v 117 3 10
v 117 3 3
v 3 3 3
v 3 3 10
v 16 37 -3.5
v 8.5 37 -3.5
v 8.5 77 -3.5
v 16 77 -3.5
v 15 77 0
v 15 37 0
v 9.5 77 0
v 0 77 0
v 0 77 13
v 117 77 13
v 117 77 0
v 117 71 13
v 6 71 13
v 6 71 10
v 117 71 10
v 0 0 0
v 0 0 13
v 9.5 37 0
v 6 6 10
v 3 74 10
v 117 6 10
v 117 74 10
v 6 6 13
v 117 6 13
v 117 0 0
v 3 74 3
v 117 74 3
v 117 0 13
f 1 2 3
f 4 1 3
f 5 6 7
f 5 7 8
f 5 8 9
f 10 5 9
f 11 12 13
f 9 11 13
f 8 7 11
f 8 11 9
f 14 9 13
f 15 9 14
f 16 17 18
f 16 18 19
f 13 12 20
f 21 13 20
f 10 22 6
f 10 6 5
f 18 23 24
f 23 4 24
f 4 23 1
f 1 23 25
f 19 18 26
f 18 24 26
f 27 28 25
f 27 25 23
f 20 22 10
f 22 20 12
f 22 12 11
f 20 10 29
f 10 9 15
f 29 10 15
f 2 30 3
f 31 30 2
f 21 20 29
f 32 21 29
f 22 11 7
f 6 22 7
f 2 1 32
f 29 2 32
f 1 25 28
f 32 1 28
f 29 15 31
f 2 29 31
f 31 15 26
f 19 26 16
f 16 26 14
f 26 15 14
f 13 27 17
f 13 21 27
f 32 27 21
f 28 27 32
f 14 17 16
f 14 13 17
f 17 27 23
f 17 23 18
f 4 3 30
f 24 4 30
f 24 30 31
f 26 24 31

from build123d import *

# Parameters (mm, degrees)
F0_W      = 117
F0_H      = 77
F1_DEPTH  = 3
F3_DEPTH  = 10
F4_W      = 71
F4_H      = 3
F5_DEPTH  = 3
F6_W      = 111
F6_H      = 3
F7_DEPTH  = 3
F8_W      = 111
F8_H      = 3
F9_DEPTH  = 3
F10_W     = 7.5
F10_H     = 40
F11_DEPTH = 3.5
F13_DEPTH = 40
F14_DEPTH = 40


with BuildPart() as f1:
    # F0 (on Top) → F1 (new body)
    with BuildSketch(Plane.XY):
        with Locations((58.5, 38.5)):
            Rectangle(F0_W, F0_H)
    extrude(amount=F1_DEPTH)

    # F2 (on face) → F3 (join)
    with BuildSketch(Plane.XY.offset(3)):
        Polygon((117, 0), (117, 3), (3, 3), (3, 74), (117, 74), (117, 77), (0, 77), (0, 0), align=None)
    extrude(amount=F3_DEPTH)

    # F4 (on face) → F5 (join)
    with BuildSketch(Plane.YZ.offset(3)):
        with Locations((38.5, 11.5)):
            Rectangle(F4_W, F4_H)
    extrude(amount=F5_DEPTH)

    # F6 (on face) → F7 (join)
    with BuildSketch(Plane(origin=(0, 3, 0), x_dir=(-1, 0, 0), z_dir=(0, 1, 0))):
        with Locations((-61.5, 11.5)):
            Rectangle(F6_W, F6_H)
    extrude(amount=F7_DEPTH)

    # F8 (on face) → F9 (join)
    with BuildSketch(Plane.XZ.offset(-74)):
        with Locations((61.5, 11.5)):
            Rectangle(F8_W, F8_H)
    extrude(amount=F9_DEPTH)

    # F10 (on face) → F11 (join)
    with BuildSketch(Plane(origin=(0, 0, 0), x_dir=(1, 0, 0), z_dir=(0, 0, -1))):
        with Locations((12.25, -57)):
            Rectangle(F10_W, F10_H)
    extrude(amount=F11_DEPTH)

    # F12 (on face) → F13 (cut)
    with BuildSketch(Plane(origin=(0, 77, 0), x_dir=(-1, 0, 0), z_dir=(0, 1, 0))):
        Polygon((-16, 0), (-16, -3.5), (-15, 0), align=None)
    extrude(amount=-F13_DEPTH, mode=Mode.SUBTRACT)

    # F12 (on face) → F14 (cut)
    with BuildSketch(Plane(origin=(0, 77, 0), x_dir=(-1, 0, 0), z_dir=(0, 1, 0))):
        Polygon((-9.5, 0), (-8.5, -3.5), (-8.5, 0), align=None)
    extrude(amount=-F14_DEPTH, mode=Mode.SUBTRACT)


solid = f1.part
